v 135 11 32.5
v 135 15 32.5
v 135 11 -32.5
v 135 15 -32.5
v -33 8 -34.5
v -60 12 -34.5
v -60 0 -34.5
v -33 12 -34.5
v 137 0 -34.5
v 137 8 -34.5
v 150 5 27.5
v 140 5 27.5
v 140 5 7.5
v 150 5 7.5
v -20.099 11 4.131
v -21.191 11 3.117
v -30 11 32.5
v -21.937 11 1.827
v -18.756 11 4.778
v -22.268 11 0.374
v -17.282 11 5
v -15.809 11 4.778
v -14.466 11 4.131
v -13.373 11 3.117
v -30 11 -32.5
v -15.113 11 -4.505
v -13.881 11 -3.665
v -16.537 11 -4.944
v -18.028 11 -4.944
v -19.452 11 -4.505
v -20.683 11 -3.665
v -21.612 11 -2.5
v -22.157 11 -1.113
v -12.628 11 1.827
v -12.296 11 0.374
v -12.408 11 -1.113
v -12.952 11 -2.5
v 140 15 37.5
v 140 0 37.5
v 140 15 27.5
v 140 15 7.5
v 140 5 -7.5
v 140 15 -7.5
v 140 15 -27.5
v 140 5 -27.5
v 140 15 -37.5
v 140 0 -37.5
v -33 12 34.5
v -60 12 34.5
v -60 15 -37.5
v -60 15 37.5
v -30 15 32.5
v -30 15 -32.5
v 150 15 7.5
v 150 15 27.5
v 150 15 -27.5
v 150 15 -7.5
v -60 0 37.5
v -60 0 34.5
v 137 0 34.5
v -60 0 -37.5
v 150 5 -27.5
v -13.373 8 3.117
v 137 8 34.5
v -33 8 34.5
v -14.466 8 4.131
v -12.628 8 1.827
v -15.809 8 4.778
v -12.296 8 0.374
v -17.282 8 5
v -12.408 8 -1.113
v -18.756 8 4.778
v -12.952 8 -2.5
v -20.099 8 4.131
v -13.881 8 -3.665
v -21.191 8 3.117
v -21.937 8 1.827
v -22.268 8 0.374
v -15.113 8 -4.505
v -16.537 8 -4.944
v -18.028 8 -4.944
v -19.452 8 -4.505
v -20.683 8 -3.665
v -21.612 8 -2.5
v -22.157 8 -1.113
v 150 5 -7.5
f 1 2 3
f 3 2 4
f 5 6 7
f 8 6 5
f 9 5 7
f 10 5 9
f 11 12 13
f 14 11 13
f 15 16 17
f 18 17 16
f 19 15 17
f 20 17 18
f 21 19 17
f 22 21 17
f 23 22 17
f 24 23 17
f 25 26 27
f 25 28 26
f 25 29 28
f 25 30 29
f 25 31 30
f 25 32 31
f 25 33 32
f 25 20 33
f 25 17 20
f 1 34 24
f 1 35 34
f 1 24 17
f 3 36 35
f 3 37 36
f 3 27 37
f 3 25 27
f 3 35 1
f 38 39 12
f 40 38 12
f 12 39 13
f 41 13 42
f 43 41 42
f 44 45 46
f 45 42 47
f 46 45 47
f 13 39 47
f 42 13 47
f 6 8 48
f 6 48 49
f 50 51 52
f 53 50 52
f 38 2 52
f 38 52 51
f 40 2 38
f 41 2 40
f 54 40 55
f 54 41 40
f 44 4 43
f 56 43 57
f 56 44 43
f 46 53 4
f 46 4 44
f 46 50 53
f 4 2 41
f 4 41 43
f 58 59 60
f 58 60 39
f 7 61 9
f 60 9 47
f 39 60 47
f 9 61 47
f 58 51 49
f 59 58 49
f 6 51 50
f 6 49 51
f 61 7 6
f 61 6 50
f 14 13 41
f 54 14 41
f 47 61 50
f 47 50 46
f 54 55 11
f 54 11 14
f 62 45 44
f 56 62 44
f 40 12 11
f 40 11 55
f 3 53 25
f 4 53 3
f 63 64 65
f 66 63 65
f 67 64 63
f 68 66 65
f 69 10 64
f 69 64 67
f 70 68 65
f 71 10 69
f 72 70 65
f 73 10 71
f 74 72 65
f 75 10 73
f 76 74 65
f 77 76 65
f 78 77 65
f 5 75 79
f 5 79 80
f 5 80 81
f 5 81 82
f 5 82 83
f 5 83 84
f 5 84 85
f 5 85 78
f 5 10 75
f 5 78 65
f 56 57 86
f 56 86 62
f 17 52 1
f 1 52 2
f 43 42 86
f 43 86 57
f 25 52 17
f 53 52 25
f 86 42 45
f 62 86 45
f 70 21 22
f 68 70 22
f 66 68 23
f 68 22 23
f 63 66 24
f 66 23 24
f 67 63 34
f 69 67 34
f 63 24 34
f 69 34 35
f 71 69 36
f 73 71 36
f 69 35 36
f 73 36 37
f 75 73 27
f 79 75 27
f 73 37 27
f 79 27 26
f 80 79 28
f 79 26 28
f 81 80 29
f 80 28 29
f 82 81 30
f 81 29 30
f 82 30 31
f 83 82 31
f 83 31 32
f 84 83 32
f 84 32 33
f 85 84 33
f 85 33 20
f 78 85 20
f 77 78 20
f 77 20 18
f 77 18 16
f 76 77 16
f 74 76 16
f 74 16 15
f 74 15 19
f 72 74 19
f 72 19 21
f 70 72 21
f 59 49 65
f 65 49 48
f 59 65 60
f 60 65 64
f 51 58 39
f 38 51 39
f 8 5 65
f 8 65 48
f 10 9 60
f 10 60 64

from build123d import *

# Parameters (mm, degrees)
SKETCH1_W           = 200
SKETCH1_H           = 75
BOSS_EXTRUDE1_DEPTH = 15
SKETCH9_W           = 165
SKETCH9_H           = 65
CUT_EXTRUDE5_DEPTH  = 4
SHELL3_START        = -34.5
SHELL3_DEPTH        = 69
SKETCH14_W          = 20
SKETCH14_H          = 10
BOSS_EXTRUDE5_DEPTH = 10
SKETCH15_R          = 5
CUT_EXTRUDE7_DEPTH  = 156.007257895


# Read off the part's stored shape, not the designer's step: Shell3
with BuildPart() as part:
    # Sketch1 → Boss-Extrude1 (new body)
    with BuildSketch(Plane(origin=(0, 0, 0), x_dir=(1, 0, 0), z_dir=(0, 1, 0))):
        with Locations((40, 0)):
            Rectangle(SKETCH1_W, SKETCH1_H)
    extrude(amount=BOSS_EXTRUDE1_DEPTH)

    # Sketch9 → Cut-Extrude5 (cut)
    with BuildSketch(Plane(origin=(0, 15, 0), x_dir=(1, 0, 0), z_dir=(0, 1, 0))):
        with Locations((52.5, 0)):
            Rectangle(SKETCH9_W, SKETCH9_H)
    extrude(amount=-CUT_EXTRUDE5_DEPTH, mode=Mode.SUBTRACT)

    # Shell3 outline → Shell3 (cut)
    with BuildSketch(Plane.XY.offset(SHELL3_START)):
        Polygon((137, 0), (137, 8), (-33, 8), (-33, 12), (-60, 12), (-60, 0), align=None)
    extrude(amount=SHELL3_DEPTH, mode=Mode.SUBTRACT)

    # Sketch14 → Boss-Extrude5 (add)
    with BuildSketch(Plane(origin=(140, 0, 0), x_dir=(0, 0, -1), z_dir=(1, 0, 0))):
        with Locations((-17.5, 10)):
            Rectangle(SKETCH14_W, SKETCH14_H)
        with Locations((17.5, 10)):
            Rectangle(SKETCH14_W, SKETCH14_H)
    extrude(amount=BOSS_EXTRUDE5_DEPTH)

    # Sketch15 → Cut-Extrude7 (cut, through all)
    with BuildSketch(Plane(origin=(0, 11, 0), x_dir=(1, 0, 0), z_dir=(0, 1, 0))):
        with Locations(Location((-17.28231035, 0, 0), (0, 0, 270))):
            Circle(SKETCH15_R)
    extrude(amount=-CUT_EXTRUDE7_DEPTH, mode=Mode.SUBTRACT)


solid = part.part
